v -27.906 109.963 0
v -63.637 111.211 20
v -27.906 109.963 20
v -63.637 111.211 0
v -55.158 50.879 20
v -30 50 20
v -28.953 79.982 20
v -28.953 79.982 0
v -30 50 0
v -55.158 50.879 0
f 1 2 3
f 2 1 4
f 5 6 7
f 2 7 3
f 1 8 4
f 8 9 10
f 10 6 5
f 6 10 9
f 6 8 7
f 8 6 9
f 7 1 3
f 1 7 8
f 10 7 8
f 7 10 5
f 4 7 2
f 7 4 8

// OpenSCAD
translate([-30,50,0])
scale([3,3,1])
rotate([0,0,+88]) {
    difference() {
        cube([20, 20, 20]);
        translate([10, 0, -1]) {
            rotate([0,0,50]) {
                cube([30, 30, 30]);
            }
        }
    }
}
